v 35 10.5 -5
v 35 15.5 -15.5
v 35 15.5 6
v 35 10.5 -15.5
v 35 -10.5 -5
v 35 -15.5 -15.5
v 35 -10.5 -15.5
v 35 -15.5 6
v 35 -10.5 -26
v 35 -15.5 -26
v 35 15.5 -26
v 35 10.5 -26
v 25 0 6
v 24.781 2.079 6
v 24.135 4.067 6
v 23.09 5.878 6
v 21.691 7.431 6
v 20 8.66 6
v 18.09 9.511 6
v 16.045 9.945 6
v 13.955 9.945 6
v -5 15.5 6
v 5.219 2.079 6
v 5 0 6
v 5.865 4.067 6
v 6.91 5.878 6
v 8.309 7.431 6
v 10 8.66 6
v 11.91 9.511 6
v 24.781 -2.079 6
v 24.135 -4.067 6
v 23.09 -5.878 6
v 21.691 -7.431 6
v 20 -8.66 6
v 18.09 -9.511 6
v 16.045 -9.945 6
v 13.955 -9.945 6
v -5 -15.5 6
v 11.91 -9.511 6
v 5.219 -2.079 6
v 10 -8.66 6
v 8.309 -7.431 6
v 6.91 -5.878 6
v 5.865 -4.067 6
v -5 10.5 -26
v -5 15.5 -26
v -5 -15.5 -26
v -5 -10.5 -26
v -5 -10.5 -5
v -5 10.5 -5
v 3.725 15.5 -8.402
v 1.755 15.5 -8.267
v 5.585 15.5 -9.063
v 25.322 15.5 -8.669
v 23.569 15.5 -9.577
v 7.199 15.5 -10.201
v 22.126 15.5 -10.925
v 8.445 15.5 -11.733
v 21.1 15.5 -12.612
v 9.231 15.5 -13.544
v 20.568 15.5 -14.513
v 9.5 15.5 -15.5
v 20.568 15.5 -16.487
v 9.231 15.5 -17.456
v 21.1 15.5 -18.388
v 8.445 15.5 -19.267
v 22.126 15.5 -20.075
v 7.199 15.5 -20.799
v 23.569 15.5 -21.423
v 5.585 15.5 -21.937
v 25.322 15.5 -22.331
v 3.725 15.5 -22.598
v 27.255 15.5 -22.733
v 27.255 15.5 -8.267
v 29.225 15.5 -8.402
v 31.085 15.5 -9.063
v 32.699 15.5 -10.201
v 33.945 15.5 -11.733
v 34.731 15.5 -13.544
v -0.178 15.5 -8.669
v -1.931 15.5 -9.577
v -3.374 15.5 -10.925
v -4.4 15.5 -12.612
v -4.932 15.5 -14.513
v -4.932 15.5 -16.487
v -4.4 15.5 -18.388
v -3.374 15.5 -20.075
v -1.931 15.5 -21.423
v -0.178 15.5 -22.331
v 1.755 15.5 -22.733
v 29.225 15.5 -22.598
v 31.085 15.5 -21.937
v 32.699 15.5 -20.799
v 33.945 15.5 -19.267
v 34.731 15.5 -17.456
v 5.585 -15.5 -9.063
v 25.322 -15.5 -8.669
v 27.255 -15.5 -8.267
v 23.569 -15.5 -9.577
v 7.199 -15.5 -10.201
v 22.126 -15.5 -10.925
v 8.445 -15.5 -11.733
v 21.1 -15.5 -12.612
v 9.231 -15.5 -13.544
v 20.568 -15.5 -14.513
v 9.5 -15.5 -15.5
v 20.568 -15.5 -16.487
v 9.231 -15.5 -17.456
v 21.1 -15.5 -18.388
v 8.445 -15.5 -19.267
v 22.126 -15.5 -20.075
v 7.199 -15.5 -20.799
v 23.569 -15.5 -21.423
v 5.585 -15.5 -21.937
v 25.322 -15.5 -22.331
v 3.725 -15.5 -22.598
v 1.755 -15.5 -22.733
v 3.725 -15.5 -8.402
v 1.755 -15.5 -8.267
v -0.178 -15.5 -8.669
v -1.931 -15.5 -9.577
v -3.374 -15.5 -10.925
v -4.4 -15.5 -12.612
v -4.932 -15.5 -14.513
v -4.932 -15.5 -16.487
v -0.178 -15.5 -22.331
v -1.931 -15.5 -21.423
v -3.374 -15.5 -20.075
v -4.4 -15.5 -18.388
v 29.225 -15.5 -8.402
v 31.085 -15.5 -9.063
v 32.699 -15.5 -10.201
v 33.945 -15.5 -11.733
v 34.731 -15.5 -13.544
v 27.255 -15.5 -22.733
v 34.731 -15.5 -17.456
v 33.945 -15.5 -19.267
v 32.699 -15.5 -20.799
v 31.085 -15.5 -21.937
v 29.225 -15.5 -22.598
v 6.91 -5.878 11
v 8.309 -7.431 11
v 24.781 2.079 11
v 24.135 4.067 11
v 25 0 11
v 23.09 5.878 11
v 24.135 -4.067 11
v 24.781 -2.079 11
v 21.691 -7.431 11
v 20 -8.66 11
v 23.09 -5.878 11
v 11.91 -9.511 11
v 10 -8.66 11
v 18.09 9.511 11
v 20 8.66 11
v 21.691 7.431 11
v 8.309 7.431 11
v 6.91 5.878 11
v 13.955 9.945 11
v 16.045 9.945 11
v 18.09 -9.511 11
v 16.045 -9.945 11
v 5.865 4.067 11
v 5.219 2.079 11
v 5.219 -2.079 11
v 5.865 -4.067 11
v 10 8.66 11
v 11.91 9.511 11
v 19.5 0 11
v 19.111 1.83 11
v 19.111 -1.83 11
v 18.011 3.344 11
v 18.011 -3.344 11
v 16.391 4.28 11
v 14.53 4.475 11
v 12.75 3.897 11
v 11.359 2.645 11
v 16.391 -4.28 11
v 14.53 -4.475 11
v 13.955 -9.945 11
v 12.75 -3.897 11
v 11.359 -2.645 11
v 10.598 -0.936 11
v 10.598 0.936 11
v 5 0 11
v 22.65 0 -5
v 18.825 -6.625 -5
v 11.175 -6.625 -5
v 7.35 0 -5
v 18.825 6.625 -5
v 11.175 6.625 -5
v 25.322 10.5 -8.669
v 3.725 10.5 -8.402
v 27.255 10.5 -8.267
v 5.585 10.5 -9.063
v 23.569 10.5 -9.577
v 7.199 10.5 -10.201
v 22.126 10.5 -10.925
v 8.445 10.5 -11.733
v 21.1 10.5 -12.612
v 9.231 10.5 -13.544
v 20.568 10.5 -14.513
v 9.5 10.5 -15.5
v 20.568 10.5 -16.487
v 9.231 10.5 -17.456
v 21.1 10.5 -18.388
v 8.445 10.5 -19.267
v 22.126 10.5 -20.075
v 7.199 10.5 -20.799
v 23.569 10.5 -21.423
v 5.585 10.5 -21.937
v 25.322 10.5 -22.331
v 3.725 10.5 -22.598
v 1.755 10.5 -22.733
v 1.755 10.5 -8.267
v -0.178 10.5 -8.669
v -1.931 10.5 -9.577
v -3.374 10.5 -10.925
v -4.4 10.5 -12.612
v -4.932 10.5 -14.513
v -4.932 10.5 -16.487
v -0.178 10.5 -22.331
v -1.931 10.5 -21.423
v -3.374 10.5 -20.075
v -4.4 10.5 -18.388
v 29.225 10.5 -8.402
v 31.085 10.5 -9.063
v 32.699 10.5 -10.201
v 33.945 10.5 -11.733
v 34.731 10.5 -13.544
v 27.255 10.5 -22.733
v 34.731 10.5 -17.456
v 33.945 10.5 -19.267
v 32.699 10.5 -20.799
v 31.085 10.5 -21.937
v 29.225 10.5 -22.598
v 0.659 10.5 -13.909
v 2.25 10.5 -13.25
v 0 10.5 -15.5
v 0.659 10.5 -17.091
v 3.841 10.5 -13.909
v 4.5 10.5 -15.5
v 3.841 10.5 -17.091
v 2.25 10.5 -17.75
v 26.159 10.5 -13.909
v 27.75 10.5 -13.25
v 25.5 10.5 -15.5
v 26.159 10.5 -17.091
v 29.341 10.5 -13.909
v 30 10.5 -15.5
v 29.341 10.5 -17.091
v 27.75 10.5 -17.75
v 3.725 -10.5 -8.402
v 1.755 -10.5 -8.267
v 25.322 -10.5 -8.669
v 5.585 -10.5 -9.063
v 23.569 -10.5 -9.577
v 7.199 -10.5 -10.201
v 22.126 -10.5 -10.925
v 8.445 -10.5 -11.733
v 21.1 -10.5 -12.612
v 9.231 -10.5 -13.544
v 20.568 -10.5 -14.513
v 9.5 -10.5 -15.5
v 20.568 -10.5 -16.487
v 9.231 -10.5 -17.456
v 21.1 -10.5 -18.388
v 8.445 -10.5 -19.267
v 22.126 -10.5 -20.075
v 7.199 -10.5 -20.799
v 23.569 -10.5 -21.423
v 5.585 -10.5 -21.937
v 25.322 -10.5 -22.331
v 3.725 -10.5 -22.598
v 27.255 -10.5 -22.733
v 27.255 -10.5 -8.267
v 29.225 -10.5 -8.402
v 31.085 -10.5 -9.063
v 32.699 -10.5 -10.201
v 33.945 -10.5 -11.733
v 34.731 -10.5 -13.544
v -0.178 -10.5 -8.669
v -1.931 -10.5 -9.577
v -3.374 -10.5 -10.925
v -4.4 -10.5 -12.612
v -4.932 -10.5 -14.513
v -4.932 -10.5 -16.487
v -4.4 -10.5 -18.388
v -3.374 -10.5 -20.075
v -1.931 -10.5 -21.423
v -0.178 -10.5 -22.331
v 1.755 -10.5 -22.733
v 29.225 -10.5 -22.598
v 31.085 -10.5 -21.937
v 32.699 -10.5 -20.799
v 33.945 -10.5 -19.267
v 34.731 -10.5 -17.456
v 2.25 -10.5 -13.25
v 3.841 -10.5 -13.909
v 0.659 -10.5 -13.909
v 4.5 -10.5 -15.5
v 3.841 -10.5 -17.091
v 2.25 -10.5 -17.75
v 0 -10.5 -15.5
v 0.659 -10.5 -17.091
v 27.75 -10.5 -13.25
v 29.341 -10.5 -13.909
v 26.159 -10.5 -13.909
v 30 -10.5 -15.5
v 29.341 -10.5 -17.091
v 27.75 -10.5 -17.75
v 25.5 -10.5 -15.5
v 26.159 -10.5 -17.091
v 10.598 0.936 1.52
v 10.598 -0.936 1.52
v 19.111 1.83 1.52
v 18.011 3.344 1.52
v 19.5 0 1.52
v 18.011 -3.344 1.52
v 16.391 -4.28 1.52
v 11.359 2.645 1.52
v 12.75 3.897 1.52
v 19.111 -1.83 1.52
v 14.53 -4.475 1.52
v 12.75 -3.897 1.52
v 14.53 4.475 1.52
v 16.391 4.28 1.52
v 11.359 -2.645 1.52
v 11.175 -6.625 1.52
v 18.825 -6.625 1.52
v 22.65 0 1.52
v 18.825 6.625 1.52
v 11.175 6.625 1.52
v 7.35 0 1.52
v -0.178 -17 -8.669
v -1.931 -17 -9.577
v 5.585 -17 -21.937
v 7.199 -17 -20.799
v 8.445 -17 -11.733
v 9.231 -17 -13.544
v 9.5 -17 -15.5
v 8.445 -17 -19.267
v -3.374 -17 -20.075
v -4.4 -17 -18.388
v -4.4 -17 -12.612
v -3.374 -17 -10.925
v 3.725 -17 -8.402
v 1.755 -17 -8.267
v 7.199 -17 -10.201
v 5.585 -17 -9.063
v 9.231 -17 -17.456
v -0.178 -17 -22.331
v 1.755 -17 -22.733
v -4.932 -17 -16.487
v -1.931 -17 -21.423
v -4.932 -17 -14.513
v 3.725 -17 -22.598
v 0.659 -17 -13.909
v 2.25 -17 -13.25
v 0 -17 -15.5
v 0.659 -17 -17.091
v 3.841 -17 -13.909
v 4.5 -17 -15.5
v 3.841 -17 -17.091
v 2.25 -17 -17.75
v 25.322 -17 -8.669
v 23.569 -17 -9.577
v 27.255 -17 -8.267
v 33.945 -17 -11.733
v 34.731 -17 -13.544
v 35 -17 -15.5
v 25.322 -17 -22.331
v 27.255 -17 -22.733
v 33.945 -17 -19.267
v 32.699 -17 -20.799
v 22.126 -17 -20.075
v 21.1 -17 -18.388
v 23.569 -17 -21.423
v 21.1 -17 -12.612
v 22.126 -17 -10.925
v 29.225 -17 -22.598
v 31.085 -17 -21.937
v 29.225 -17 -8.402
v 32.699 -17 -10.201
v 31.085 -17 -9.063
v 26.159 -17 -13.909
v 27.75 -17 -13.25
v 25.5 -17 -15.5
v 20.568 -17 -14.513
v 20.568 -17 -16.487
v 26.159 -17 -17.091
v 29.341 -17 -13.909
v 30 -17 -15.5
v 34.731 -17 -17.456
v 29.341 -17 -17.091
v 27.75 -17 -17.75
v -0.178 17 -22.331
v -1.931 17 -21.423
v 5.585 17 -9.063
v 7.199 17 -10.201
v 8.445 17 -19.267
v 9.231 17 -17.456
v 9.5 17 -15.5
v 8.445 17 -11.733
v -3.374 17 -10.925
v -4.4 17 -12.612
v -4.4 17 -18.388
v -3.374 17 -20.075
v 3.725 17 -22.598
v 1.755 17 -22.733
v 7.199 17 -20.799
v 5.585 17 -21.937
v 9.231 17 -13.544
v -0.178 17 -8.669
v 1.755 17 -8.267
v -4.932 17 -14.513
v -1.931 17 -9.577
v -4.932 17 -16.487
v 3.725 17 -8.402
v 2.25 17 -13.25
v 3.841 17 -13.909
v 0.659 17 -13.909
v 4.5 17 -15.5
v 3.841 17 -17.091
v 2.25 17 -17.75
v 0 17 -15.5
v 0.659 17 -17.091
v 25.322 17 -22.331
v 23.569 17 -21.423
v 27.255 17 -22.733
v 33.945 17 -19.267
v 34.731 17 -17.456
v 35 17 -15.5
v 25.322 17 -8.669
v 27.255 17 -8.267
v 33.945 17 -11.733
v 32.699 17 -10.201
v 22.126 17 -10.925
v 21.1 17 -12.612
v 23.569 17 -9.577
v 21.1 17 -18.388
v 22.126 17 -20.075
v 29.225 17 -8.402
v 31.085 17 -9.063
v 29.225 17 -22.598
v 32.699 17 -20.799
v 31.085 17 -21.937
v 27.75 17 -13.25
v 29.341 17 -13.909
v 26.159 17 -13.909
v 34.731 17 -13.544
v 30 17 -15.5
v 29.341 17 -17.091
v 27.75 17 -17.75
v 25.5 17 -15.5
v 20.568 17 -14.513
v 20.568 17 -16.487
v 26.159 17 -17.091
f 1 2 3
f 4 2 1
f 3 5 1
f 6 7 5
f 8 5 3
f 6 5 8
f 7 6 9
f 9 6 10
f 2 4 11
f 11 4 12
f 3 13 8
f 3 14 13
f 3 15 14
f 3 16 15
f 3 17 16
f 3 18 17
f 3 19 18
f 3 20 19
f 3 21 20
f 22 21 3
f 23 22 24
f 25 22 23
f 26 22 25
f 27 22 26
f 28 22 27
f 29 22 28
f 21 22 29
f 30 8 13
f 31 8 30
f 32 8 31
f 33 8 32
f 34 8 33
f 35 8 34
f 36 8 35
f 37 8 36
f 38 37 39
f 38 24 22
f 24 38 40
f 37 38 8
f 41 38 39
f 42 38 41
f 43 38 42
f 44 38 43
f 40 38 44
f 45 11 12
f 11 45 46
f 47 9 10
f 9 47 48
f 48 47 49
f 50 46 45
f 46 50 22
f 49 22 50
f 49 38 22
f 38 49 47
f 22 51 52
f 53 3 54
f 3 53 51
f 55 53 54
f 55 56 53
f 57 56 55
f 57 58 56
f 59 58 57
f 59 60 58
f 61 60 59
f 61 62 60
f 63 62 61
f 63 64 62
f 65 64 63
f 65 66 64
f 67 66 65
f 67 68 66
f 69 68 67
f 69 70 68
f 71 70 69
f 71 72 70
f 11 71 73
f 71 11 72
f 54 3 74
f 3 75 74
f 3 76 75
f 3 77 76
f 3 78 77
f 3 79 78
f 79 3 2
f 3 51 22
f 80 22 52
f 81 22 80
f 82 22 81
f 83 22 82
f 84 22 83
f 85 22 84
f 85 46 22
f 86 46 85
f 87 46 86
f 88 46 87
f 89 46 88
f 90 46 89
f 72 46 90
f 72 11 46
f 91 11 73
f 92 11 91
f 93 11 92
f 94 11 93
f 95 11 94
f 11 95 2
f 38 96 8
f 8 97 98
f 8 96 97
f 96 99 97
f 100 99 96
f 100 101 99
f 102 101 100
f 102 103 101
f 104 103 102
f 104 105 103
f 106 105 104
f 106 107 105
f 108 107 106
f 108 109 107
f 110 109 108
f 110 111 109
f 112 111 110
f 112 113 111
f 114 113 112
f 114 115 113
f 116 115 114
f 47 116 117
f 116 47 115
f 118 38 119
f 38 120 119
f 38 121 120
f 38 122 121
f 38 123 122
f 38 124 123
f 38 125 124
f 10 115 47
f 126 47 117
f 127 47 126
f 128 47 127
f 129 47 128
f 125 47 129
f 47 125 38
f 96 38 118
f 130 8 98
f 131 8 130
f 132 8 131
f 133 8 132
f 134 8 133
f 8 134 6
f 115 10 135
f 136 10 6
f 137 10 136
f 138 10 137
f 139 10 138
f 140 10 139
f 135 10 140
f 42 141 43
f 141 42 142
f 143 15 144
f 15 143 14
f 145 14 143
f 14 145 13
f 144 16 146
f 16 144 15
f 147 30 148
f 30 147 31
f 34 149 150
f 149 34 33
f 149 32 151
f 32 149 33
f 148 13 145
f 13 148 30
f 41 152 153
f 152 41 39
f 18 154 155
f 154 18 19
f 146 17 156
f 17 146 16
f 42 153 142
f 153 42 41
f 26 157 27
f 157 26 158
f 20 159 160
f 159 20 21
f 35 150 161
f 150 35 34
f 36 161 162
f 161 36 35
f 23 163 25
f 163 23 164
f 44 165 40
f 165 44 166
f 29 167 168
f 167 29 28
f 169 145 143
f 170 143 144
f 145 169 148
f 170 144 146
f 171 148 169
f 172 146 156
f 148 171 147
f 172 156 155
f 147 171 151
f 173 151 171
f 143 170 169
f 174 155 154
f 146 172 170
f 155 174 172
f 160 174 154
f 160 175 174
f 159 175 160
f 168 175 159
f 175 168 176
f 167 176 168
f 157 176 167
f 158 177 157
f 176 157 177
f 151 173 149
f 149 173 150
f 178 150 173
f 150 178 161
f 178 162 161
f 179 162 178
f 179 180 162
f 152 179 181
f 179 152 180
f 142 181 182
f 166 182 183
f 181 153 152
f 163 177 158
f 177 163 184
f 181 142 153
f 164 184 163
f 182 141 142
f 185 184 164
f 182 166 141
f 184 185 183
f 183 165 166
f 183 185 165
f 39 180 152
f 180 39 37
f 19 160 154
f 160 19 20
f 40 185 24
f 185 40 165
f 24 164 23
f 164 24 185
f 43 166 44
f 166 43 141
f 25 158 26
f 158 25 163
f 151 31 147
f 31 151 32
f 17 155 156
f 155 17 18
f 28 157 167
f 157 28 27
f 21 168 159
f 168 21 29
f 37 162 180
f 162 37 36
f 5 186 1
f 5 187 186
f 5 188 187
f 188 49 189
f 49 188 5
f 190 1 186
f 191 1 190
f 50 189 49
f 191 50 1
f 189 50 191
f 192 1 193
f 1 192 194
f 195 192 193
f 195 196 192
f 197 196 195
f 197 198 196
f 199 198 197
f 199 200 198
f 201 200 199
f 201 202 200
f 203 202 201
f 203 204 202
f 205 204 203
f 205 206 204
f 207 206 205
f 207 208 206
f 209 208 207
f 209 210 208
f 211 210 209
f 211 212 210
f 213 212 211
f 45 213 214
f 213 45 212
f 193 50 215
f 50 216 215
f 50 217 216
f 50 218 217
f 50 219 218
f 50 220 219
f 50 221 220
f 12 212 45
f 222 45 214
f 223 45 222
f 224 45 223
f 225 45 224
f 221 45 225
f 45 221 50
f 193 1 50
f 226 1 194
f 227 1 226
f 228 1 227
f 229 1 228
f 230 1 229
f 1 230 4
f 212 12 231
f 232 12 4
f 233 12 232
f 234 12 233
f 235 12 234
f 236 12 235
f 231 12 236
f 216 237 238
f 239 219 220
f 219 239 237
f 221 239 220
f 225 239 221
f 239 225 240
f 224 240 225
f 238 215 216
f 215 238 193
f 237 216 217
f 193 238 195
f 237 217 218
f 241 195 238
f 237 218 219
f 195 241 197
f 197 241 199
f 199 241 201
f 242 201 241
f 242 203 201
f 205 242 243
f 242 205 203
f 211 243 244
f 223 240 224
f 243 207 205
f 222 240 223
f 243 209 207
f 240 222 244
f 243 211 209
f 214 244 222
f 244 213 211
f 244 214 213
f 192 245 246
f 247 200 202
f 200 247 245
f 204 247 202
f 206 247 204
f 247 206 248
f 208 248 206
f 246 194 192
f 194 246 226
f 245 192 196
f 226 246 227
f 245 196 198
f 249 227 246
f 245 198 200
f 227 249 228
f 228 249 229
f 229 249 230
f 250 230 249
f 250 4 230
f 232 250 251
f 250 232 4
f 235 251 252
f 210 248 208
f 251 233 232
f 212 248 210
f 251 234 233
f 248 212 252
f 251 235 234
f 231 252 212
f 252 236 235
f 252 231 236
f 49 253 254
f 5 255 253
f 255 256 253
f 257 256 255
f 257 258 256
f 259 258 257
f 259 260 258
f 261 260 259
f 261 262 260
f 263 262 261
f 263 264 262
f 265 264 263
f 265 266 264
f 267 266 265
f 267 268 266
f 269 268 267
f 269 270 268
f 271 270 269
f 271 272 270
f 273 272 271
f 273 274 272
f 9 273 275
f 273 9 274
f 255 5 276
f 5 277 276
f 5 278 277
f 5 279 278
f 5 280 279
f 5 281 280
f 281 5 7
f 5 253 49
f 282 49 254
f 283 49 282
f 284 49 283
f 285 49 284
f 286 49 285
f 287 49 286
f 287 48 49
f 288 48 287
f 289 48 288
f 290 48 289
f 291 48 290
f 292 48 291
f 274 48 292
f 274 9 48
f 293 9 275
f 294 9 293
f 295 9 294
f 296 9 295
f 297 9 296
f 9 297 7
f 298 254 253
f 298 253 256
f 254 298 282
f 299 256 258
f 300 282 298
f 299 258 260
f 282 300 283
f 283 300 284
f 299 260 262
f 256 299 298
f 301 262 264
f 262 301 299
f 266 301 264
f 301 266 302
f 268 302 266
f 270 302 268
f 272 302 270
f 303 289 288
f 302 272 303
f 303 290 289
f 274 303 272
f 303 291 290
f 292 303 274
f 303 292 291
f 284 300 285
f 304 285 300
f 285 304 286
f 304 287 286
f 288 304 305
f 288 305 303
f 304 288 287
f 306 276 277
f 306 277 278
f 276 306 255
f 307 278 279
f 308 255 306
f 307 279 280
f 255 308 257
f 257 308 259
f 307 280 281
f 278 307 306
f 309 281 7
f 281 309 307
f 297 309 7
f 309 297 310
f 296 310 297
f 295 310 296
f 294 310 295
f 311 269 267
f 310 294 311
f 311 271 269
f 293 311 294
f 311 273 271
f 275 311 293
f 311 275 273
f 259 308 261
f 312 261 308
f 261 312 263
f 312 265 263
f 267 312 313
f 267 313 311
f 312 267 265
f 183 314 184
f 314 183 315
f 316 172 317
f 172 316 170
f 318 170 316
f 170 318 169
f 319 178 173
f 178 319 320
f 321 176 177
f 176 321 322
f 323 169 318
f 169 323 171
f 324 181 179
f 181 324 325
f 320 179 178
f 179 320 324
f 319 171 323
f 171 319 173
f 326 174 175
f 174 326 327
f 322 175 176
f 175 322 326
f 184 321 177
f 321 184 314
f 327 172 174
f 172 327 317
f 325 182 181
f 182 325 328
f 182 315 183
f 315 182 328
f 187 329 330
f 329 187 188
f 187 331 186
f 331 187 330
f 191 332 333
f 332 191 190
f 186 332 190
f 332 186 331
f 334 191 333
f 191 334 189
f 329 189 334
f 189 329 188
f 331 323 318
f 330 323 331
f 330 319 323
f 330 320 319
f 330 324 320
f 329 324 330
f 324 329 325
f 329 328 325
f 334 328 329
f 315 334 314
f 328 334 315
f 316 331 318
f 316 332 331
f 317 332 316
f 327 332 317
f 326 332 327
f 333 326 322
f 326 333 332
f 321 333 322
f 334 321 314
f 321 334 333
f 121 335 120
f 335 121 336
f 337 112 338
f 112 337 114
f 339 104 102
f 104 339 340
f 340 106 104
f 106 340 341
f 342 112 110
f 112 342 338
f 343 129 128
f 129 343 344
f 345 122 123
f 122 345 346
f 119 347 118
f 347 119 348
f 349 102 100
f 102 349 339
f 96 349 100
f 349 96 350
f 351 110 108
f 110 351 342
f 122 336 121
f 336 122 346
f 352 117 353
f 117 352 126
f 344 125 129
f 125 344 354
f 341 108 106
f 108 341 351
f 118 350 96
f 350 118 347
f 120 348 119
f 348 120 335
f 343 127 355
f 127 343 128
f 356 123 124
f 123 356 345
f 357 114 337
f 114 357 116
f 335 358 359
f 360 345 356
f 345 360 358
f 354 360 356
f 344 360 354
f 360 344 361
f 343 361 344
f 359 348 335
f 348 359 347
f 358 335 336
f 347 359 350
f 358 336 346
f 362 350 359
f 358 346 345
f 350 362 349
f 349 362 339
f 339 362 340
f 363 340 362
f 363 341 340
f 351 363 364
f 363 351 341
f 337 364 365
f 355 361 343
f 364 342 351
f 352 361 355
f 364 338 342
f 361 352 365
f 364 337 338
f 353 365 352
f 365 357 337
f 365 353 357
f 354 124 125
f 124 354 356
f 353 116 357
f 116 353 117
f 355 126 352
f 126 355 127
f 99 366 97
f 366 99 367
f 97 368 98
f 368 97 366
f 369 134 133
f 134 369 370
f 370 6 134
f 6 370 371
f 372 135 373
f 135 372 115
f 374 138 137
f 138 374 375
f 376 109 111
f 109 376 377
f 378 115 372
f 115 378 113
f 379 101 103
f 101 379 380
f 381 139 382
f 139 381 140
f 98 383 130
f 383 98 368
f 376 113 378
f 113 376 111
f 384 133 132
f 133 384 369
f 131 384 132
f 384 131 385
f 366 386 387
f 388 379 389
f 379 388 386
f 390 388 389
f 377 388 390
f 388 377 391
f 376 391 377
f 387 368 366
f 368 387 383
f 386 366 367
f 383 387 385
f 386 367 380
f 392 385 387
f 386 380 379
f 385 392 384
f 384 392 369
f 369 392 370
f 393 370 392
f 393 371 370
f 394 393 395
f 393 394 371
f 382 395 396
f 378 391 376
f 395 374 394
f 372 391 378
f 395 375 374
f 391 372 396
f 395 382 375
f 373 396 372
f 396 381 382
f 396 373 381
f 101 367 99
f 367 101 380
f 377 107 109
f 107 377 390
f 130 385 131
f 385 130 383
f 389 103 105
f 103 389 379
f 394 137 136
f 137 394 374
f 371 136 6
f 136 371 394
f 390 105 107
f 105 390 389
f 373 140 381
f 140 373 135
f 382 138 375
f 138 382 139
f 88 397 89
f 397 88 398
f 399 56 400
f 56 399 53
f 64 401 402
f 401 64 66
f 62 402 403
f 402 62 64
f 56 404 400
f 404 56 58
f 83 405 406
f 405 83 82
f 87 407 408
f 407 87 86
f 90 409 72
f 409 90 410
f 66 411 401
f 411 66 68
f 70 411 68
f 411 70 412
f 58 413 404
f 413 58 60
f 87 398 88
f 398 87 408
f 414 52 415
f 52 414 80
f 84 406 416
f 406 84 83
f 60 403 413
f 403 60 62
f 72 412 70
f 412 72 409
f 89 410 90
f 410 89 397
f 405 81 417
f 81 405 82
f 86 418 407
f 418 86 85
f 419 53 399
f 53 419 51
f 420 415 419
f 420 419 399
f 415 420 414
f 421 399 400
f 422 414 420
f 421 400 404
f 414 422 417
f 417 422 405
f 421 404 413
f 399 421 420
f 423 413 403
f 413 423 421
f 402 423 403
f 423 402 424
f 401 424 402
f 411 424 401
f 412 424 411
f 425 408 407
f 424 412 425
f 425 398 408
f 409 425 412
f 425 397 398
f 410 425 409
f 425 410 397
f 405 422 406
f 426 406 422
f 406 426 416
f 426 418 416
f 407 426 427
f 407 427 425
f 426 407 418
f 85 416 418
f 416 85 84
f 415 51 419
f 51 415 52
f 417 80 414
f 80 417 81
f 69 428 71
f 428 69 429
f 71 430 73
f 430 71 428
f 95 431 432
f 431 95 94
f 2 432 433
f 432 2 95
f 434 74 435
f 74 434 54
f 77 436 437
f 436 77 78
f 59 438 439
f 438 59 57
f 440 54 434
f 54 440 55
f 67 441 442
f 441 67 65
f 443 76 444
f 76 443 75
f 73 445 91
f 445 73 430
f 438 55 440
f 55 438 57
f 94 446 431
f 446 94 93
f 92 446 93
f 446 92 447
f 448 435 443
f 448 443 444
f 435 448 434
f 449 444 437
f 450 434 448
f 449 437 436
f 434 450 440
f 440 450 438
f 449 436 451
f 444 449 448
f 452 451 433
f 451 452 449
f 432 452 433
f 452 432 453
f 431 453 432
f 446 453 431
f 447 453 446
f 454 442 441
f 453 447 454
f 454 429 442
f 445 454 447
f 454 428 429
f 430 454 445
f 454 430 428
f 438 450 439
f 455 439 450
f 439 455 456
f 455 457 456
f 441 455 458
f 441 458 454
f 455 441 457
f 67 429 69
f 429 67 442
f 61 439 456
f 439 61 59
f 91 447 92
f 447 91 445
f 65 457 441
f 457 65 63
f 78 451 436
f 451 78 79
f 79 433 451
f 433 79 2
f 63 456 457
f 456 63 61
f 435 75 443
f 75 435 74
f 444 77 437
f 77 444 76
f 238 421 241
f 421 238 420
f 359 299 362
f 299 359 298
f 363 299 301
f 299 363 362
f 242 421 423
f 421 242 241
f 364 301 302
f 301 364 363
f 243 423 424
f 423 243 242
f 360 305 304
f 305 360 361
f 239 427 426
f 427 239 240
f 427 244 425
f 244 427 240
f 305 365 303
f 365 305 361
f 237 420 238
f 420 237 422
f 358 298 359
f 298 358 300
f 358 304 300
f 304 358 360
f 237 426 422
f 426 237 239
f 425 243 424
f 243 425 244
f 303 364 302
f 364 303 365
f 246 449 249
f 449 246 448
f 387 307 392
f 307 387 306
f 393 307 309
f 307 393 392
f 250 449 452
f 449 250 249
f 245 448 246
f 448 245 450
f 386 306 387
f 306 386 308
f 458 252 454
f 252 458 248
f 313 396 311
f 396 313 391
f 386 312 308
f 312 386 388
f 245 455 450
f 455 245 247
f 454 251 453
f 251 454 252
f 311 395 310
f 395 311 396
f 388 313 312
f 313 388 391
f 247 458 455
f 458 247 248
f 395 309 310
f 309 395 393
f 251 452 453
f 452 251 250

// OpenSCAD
lonNEMA=42.3;

module agujerosNEMA(){
    
    //agujero central
    circle(d=22+1+1);
    
    //agujeros montaje  
    for(v=[0:3]){
      rotate(90*v)
      //translate([16,16])
        translate([15.5,15.5])
      circle(d=3.1+0.25);
    }
    
}

 module monturaSpool(){
    tol=1;
    diamTorBal=4.6;
    distBalerosX=40;
    //lonNEMA=42.3;
    distEntreTorY=lonNEMA+24+(tol*2);
    diamTorProf=5.8;
    minkow=7;
    alturaPoste=8.3;
    espesor=5;//espesor 6
    calcePerfil=3.67;
    diamTuerca=10.58;
    altTuerca=3.5;

    esp=3.75;
    altPil=16;
    disXP=24.75;
    offNema=35;
    
    tolM4=0.5;//antes 0.25
    minkBase=10;
    alturaNema=40+1.3;
            
    perfil=20;
     canal=6;
     ajEsX=4;
     diamT=7;

     angulo=90;
     ajNema=5;
     ajNemaY=6;
     
      lon20=20;
  
     rec45=sqrt(pow(lonNEMA/2,2)+pow(lonNEMA/2,2));


    //23 mm referido a la altura del motor nema hacia el perfil
     
    //apoyo tornillos a perfil

    difference(){
     
        diamPostes=4+tolM4+(espesor*2);
        
         lonY_c=lon20+(espesor*2)+tol;
         lonX_c=lon20*2;
         lonZ_c=lon20+tol+espesor;
               union(){
                   
                     //postes para tornillos
                   
      //cubo para tornillos
                    //translate([-espesor,-espesor-(lon20/2),-lon20])
                   // cube([lon20*3,espesor,lon20]);
                 grosExtra=6;
               translate([(lonX_c/2)-espesor,0,-(lonZ_c/2)])
                difference(){ 
                  translate([0,0,grosExtra/2])
                      union(){  
                         cube([lonX_c,lonY_c,lonZ_c+grosExtra],center=true);              //poste de carrete
                          translate([0,0,-(lonZ_c+grosExtra)/2])
                         cylinder(d=20,h=lonZ_c+grosExtra+espesor);
                      }
                    translate([0,0,-espesor/2])
                   cube([lonX_c*2,lonY_c-(espesor*2),lonZ_c-espesor],center=true);
                    //recorte tornillo m8
                    cylinder(d=8+tol,h=100,center=true);
                   
                   //recorte cabeza tornillo m8
                   translate([0,0,(lonZ_c/2)-(espesor)])
                    cylinder(d=14.3+tol,h=(5.52*2)+(2*tol),$fn=6,center=true);
                }
                
                  //postes tronillos M4 con 2mm extra
                
              
                  
                 for(g=[0:1]){
                    translate([0,0,g*2*(-(tol/2)-espesor-(lon20/2))])
                   rotate([180*g,0,0])
                   translate([-espesor+(diamPostes/2),-(lon20/2)-(tol/2),(-(tol/2)-espesor-(lon20/2))])
                   
                    for(u=[0:1]){
                      translate([(lonX_c-diamPostes)*u,0,0])
                        rotate([90,0,0])
                      cylinder(d=diamPostes,h=espesor+1.5); 
                    }//for u
                  }//for g
                         
                }
                 //taladros postes tronillos m4
                 translate([-espesor+(diamPostes/2),0,(-(tol/2)-espesor-(lon20/2))])
                for(u=[0:1]){
                  translate([(lonX_c-diamPostes)*u,0,0])
                  rotate([90,0,0])
                  cylinder(d=4+tolM4,h=1000,center=        true); 
                }
                
            }
          
            exAncho=(lon20*2)-espesor;
            
            despX=0;//desplazamiento de apoyoNEMA en X
            despZ=5;
            
            
 
 }//fin modulo
 
 
 
  //chaflan de 1mm para los apoyos de los tornillos
 //fillet de 5mm para las orillas
 //fillet de 3mm para las orillas
monturaSpool();
